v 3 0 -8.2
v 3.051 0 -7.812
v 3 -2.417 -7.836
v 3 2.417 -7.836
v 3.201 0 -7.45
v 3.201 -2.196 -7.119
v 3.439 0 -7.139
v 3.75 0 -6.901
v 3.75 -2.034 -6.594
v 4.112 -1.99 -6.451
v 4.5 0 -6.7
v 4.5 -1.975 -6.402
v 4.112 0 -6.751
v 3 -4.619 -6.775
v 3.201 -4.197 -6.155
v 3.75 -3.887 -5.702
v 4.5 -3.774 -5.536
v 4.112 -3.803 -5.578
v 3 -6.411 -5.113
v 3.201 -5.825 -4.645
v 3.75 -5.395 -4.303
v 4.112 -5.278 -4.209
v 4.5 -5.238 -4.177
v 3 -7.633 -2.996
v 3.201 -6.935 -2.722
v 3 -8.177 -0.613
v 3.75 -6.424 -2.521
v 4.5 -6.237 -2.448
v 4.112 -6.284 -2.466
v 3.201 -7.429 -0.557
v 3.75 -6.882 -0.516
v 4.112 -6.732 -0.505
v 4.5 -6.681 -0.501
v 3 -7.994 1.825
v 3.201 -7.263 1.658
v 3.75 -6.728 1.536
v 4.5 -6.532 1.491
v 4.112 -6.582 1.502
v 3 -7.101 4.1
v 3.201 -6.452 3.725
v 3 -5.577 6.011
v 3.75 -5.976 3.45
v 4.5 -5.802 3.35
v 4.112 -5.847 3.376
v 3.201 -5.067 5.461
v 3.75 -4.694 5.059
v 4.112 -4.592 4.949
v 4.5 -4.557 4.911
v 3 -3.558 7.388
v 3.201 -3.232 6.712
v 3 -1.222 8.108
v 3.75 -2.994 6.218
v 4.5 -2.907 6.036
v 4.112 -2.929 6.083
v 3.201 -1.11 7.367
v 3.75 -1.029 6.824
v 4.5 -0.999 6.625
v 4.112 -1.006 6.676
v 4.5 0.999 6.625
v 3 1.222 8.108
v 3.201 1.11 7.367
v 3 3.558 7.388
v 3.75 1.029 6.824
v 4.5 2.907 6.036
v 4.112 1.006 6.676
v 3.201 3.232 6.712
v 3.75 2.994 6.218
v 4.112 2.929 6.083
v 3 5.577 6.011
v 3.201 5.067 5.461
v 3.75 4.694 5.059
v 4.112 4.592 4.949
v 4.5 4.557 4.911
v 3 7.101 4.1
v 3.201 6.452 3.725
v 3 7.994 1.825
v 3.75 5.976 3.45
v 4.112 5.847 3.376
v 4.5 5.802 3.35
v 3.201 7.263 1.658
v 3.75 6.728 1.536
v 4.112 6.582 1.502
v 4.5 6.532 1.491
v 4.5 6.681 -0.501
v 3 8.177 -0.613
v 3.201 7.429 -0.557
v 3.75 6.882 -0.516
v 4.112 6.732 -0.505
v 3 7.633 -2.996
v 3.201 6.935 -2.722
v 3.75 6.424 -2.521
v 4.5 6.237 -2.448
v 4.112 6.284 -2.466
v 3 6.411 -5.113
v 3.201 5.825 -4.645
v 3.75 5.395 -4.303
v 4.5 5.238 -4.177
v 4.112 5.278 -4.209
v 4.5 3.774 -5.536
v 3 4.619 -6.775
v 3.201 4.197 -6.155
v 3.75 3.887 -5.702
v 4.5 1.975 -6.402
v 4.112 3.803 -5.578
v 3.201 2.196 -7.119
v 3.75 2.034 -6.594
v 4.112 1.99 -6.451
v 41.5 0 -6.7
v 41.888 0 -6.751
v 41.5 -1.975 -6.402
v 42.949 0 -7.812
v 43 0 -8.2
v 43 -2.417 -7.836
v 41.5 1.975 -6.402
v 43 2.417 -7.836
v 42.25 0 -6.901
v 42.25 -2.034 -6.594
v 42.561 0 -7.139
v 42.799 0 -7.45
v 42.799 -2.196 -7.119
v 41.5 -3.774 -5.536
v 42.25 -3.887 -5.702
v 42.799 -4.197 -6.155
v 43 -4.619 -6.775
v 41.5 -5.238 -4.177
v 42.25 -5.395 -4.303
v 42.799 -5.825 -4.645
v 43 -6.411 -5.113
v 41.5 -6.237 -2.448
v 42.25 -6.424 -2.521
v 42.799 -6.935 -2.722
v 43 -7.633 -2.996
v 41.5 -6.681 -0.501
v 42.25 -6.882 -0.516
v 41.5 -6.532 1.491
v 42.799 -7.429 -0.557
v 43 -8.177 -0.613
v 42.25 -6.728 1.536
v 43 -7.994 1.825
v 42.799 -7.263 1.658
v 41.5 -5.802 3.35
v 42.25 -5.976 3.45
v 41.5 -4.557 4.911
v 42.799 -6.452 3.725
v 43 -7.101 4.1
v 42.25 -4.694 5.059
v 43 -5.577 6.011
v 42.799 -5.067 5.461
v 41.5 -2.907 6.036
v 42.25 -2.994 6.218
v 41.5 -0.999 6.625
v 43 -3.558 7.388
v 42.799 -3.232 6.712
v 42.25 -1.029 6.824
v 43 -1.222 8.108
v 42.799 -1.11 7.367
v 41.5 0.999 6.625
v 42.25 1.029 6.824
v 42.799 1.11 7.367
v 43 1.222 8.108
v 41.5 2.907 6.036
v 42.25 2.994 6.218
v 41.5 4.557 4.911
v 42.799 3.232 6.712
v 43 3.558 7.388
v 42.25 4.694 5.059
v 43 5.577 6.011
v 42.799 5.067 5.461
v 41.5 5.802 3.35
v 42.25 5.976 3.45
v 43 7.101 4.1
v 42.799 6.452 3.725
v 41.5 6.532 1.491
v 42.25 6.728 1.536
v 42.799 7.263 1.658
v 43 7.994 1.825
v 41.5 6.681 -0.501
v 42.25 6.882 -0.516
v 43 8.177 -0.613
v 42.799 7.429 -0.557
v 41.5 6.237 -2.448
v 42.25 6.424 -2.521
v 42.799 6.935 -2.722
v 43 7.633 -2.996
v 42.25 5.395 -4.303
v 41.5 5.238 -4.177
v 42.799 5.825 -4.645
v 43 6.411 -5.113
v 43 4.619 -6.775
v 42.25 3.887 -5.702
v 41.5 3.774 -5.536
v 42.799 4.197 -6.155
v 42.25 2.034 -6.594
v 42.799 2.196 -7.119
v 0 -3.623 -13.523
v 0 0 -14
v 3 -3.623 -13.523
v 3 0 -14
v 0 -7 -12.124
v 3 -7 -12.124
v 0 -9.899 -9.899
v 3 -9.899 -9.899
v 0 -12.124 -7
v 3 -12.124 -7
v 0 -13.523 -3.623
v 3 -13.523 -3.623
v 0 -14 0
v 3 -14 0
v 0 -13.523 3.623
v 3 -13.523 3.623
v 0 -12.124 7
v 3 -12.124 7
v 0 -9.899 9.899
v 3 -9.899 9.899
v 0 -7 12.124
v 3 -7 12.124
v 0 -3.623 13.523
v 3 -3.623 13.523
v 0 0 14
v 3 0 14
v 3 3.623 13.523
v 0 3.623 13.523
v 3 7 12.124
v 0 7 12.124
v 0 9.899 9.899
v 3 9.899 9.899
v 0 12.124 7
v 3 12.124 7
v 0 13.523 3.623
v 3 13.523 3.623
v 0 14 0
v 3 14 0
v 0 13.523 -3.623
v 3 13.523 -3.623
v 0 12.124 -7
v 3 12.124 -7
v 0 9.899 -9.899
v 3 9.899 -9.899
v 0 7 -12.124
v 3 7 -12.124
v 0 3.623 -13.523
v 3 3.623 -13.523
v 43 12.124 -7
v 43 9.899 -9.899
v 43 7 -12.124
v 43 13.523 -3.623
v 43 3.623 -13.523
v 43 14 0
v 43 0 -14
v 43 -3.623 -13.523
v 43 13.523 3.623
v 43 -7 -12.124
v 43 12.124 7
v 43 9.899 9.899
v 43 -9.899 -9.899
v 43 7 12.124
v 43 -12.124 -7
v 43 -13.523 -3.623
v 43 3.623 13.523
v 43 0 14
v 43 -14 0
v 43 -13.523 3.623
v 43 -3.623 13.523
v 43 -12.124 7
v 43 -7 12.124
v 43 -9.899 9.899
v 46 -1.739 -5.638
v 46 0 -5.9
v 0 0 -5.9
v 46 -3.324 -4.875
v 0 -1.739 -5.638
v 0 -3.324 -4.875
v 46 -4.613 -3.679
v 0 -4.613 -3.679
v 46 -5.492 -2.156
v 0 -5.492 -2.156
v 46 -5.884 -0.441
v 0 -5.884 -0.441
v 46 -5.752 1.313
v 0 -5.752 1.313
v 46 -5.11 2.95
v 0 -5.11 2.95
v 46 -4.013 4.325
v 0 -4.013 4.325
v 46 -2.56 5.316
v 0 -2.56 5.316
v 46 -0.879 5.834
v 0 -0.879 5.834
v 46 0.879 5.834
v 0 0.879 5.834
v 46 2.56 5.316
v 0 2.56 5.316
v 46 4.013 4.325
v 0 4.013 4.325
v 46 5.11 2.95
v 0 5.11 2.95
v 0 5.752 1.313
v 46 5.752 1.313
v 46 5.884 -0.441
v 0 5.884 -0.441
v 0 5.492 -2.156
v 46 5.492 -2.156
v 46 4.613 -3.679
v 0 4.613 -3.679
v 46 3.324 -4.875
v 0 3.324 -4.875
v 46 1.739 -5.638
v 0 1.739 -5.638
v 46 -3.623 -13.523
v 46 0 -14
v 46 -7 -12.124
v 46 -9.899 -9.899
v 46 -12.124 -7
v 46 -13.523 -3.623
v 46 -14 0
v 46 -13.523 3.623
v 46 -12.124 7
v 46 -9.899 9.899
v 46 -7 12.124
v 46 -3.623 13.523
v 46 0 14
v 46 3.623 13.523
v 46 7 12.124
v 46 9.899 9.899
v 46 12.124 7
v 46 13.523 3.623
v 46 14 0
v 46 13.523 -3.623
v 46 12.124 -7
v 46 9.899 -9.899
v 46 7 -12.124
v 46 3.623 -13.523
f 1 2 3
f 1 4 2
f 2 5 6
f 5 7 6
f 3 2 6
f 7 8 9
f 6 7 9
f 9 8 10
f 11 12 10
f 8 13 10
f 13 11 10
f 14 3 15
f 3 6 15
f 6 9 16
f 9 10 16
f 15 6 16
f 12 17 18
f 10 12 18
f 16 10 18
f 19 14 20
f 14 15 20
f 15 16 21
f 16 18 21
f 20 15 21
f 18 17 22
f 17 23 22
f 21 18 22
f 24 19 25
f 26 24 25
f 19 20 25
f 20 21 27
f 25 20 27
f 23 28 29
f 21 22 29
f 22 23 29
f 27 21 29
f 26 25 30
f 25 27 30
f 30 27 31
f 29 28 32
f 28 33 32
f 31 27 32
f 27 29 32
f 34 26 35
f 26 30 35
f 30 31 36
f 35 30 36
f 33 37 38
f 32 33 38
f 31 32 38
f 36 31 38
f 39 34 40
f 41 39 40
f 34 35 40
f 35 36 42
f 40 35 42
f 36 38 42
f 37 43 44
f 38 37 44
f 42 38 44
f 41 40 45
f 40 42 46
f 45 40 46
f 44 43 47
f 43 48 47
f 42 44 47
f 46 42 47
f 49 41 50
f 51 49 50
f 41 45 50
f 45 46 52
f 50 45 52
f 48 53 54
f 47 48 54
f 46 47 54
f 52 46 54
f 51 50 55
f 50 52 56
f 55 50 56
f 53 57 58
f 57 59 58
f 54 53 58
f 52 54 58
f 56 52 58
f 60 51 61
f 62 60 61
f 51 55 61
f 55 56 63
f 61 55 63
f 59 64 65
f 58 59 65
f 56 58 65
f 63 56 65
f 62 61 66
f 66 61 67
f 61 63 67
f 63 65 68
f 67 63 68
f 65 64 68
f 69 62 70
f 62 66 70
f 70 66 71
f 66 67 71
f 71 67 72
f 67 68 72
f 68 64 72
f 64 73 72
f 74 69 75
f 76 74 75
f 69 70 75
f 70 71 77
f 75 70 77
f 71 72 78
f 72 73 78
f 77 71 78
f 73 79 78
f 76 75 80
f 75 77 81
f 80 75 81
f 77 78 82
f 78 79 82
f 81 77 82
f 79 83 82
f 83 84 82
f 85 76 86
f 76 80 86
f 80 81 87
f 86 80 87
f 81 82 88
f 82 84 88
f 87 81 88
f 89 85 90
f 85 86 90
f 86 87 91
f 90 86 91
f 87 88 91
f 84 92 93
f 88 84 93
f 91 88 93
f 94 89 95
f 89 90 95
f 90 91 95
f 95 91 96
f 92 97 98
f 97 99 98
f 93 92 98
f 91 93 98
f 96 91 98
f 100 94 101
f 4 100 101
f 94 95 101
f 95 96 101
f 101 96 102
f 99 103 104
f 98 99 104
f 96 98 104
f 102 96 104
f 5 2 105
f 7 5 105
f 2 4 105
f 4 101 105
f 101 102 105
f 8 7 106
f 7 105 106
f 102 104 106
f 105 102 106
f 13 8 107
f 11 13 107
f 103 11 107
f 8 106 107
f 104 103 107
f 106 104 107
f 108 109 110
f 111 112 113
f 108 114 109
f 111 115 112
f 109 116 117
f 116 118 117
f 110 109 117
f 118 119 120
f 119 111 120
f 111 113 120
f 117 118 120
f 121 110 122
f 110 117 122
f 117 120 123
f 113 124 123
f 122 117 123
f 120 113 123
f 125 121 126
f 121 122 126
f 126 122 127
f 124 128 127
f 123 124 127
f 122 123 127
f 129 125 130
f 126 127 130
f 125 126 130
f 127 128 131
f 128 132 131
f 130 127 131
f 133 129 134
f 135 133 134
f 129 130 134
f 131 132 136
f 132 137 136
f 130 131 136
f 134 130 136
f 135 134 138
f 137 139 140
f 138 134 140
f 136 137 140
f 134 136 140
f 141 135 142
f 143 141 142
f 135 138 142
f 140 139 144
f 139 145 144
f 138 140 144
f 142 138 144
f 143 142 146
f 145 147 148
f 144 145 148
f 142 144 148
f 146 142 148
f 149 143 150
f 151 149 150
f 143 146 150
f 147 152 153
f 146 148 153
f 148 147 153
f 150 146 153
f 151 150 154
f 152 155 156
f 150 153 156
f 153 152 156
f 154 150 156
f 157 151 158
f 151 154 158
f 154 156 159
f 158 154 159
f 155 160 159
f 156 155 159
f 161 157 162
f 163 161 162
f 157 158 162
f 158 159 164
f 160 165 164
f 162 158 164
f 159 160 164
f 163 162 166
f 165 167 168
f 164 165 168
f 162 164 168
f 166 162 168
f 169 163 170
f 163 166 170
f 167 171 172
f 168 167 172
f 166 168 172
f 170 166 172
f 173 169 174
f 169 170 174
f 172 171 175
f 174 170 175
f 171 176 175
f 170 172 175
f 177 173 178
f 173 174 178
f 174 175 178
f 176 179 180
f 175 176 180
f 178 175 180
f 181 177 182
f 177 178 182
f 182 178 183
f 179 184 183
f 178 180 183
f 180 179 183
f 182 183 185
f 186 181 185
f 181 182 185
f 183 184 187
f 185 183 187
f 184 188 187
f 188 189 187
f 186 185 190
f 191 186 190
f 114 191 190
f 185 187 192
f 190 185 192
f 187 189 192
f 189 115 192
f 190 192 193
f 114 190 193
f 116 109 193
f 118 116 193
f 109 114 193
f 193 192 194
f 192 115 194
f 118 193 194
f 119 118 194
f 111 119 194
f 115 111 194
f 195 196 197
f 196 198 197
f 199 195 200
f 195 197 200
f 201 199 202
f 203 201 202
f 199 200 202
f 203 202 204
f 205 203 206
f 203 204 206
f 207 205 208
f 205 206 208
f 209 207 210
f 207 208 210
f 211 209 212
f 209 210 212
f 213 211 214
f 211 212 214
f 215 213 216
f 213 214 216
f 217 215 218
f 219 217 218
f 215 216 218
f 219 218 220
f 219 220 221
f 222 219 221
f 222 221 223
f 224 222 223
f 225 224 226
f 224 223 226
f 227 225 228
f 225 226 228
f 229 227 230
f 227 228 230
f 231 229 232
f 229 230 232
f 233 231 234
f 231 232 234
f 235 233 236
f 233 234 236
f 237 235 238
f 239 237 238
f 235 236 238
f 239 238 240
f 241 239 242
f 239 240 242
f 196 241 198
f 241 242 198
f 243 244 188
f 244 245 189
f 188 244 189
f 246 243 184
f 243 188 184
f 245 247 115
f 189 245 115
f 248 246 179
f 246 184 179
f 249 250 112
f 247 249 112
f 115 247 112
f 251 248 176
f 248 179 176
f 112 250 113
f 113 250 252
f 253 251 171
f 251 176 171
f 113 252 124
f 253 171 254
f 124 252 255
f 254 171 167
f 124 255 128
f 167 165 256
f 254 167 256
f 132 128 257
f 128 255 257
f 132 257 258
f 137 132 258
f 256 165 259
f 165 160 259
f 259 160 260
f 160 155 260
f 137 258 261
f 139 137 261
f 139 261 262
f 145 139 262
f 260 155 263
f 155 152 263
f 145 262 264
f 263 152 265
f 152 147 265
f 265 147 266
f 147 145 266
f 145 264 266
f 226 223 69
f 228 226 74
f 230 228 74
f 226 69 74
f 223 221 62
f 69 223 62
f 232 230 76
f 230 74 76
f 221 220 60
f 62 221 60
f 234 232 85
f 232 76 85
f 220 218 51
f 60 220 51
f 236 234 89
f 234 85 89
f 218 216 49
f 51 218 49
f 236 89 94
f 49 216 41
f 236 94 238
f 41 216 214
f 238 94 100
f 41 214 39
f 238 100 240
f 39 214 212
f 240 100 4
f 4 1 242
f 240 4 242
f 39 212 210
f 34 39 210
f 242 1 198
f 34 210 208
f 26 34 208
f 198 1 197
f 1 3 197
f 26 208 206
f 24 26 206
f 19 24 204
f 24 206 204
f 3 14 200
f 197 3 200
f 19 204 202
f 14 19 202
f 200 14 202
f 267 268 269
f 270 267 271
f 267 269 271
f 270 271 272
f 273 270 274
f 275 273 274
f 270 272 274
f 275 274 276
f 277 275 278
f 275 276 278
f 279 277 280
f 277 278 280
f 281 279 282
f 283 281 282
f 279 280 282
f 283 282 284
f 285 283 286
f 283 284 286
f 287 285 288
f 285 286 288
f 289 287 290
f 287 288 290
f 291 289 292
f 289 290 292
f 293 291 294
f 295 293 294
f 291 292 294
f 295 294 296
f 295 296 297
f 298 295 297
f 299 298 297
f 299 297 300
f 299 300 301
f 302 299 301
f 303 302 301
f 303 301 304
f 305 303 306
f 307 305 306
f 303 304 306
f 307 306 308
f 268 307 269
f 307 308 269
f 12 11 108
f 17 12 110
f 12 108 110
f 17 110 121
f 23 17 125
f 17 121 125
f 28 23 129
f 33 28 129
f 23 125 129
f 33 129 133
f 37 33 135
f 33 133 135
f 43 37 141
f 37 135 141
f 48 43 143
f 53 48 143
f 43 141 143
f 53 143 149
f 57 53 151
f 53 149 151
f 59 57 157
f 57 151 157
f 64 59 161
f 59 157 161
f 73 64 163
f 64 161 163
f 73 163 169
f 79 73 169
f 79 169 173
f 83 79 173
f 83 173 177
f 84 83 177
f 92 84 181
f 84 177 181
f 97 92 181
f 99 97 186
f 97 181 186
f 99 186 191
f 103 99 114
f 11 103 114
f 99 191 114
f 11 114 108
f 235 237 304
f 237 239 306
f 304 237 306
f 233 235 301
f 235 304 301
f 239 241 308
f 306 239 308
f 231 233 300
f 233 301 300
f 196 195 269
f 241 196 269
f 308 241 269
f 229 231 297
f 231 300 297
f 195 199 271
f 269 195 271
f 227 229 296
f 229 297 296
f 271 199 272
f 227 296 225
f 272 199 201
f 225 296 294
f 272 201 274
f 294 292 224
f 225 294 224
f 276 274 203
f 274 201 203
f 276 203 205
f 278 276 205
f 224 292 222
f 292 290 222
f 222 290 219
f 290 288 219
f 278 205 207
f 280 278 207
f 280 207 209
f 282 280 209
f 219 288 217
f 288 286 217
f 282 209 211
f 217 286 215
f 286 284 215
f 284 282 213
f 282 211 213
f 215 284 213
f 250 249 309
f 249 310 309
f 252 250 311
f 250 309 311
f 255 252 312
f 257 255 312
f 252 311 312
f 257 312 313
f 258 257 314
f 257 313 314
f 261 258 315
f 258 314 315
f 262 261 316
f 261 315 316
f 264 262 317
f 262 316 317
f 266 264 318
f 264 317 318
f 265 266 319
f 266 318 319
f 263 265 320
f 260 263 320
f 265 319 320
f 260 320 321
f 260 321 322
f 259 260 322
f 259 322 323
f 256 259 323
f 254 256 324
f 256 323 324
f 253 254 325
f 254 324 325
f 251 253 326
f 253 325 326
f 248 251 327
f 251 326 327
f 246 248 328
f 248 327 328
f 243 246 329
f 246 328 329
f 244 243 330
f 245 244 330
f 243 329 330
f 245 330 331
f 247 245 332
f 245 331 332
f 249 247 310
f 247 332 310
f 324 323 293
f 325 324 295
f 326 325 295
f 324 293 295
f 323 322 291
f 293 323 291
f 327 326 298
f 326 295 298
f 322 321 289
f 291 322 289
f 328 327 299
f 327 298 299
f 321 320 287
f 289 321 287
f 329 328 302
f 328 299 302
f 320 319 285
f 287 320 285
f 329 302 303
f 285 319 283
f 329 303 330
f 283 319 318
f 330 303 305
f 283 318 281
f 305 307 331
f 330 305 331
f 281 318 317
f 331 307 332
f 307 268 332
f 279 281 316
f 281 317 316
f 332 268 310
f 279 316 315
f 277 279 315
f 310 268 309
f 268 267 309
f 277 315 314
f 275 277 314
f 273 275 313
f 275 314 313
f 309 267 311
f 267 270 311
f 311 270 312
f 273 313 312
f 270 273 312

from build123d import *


with BuildPart() as part:
    # Sketch1 → Revolve1 (revolve)
    with BuildSketch(Plane.XY, mode=Mode.PRIVATE) as revolve1_sk:
        with BuildLine():
            Line((0, 5.9), (0, 14))
            Line((0, 14), (3, 14))
            Line((3, 14), (3, 8.2))
            ThreePointArc((3, 8.2), (3.439339828, 7.139339828), (4.5, 6.7))
            Line((4.5, 6.7), (41.5, 6.7))
            ThreePointArc((41.5, 6.7), (42.560660172, 7.139339828), (43, 8.2))
            Line((43, 8.2), (43, 14))
            Line((43, 14), (46, 14))
            Line((46, 14), (46, 5.9))
            Line((46, 5.9), (43, 5.9))
            Line((43, 5.9), (3, 5.9))
            Line((3, 5.9), (0, 5.9))
        make_face()
    revolve(revolve1_sk.sketch.rotate(Axis((0, 0, 0), (-1, 0, 0)), 90), axis=Axis((0, 0, 0), (-1, 0, 0)))


solid = part.part
